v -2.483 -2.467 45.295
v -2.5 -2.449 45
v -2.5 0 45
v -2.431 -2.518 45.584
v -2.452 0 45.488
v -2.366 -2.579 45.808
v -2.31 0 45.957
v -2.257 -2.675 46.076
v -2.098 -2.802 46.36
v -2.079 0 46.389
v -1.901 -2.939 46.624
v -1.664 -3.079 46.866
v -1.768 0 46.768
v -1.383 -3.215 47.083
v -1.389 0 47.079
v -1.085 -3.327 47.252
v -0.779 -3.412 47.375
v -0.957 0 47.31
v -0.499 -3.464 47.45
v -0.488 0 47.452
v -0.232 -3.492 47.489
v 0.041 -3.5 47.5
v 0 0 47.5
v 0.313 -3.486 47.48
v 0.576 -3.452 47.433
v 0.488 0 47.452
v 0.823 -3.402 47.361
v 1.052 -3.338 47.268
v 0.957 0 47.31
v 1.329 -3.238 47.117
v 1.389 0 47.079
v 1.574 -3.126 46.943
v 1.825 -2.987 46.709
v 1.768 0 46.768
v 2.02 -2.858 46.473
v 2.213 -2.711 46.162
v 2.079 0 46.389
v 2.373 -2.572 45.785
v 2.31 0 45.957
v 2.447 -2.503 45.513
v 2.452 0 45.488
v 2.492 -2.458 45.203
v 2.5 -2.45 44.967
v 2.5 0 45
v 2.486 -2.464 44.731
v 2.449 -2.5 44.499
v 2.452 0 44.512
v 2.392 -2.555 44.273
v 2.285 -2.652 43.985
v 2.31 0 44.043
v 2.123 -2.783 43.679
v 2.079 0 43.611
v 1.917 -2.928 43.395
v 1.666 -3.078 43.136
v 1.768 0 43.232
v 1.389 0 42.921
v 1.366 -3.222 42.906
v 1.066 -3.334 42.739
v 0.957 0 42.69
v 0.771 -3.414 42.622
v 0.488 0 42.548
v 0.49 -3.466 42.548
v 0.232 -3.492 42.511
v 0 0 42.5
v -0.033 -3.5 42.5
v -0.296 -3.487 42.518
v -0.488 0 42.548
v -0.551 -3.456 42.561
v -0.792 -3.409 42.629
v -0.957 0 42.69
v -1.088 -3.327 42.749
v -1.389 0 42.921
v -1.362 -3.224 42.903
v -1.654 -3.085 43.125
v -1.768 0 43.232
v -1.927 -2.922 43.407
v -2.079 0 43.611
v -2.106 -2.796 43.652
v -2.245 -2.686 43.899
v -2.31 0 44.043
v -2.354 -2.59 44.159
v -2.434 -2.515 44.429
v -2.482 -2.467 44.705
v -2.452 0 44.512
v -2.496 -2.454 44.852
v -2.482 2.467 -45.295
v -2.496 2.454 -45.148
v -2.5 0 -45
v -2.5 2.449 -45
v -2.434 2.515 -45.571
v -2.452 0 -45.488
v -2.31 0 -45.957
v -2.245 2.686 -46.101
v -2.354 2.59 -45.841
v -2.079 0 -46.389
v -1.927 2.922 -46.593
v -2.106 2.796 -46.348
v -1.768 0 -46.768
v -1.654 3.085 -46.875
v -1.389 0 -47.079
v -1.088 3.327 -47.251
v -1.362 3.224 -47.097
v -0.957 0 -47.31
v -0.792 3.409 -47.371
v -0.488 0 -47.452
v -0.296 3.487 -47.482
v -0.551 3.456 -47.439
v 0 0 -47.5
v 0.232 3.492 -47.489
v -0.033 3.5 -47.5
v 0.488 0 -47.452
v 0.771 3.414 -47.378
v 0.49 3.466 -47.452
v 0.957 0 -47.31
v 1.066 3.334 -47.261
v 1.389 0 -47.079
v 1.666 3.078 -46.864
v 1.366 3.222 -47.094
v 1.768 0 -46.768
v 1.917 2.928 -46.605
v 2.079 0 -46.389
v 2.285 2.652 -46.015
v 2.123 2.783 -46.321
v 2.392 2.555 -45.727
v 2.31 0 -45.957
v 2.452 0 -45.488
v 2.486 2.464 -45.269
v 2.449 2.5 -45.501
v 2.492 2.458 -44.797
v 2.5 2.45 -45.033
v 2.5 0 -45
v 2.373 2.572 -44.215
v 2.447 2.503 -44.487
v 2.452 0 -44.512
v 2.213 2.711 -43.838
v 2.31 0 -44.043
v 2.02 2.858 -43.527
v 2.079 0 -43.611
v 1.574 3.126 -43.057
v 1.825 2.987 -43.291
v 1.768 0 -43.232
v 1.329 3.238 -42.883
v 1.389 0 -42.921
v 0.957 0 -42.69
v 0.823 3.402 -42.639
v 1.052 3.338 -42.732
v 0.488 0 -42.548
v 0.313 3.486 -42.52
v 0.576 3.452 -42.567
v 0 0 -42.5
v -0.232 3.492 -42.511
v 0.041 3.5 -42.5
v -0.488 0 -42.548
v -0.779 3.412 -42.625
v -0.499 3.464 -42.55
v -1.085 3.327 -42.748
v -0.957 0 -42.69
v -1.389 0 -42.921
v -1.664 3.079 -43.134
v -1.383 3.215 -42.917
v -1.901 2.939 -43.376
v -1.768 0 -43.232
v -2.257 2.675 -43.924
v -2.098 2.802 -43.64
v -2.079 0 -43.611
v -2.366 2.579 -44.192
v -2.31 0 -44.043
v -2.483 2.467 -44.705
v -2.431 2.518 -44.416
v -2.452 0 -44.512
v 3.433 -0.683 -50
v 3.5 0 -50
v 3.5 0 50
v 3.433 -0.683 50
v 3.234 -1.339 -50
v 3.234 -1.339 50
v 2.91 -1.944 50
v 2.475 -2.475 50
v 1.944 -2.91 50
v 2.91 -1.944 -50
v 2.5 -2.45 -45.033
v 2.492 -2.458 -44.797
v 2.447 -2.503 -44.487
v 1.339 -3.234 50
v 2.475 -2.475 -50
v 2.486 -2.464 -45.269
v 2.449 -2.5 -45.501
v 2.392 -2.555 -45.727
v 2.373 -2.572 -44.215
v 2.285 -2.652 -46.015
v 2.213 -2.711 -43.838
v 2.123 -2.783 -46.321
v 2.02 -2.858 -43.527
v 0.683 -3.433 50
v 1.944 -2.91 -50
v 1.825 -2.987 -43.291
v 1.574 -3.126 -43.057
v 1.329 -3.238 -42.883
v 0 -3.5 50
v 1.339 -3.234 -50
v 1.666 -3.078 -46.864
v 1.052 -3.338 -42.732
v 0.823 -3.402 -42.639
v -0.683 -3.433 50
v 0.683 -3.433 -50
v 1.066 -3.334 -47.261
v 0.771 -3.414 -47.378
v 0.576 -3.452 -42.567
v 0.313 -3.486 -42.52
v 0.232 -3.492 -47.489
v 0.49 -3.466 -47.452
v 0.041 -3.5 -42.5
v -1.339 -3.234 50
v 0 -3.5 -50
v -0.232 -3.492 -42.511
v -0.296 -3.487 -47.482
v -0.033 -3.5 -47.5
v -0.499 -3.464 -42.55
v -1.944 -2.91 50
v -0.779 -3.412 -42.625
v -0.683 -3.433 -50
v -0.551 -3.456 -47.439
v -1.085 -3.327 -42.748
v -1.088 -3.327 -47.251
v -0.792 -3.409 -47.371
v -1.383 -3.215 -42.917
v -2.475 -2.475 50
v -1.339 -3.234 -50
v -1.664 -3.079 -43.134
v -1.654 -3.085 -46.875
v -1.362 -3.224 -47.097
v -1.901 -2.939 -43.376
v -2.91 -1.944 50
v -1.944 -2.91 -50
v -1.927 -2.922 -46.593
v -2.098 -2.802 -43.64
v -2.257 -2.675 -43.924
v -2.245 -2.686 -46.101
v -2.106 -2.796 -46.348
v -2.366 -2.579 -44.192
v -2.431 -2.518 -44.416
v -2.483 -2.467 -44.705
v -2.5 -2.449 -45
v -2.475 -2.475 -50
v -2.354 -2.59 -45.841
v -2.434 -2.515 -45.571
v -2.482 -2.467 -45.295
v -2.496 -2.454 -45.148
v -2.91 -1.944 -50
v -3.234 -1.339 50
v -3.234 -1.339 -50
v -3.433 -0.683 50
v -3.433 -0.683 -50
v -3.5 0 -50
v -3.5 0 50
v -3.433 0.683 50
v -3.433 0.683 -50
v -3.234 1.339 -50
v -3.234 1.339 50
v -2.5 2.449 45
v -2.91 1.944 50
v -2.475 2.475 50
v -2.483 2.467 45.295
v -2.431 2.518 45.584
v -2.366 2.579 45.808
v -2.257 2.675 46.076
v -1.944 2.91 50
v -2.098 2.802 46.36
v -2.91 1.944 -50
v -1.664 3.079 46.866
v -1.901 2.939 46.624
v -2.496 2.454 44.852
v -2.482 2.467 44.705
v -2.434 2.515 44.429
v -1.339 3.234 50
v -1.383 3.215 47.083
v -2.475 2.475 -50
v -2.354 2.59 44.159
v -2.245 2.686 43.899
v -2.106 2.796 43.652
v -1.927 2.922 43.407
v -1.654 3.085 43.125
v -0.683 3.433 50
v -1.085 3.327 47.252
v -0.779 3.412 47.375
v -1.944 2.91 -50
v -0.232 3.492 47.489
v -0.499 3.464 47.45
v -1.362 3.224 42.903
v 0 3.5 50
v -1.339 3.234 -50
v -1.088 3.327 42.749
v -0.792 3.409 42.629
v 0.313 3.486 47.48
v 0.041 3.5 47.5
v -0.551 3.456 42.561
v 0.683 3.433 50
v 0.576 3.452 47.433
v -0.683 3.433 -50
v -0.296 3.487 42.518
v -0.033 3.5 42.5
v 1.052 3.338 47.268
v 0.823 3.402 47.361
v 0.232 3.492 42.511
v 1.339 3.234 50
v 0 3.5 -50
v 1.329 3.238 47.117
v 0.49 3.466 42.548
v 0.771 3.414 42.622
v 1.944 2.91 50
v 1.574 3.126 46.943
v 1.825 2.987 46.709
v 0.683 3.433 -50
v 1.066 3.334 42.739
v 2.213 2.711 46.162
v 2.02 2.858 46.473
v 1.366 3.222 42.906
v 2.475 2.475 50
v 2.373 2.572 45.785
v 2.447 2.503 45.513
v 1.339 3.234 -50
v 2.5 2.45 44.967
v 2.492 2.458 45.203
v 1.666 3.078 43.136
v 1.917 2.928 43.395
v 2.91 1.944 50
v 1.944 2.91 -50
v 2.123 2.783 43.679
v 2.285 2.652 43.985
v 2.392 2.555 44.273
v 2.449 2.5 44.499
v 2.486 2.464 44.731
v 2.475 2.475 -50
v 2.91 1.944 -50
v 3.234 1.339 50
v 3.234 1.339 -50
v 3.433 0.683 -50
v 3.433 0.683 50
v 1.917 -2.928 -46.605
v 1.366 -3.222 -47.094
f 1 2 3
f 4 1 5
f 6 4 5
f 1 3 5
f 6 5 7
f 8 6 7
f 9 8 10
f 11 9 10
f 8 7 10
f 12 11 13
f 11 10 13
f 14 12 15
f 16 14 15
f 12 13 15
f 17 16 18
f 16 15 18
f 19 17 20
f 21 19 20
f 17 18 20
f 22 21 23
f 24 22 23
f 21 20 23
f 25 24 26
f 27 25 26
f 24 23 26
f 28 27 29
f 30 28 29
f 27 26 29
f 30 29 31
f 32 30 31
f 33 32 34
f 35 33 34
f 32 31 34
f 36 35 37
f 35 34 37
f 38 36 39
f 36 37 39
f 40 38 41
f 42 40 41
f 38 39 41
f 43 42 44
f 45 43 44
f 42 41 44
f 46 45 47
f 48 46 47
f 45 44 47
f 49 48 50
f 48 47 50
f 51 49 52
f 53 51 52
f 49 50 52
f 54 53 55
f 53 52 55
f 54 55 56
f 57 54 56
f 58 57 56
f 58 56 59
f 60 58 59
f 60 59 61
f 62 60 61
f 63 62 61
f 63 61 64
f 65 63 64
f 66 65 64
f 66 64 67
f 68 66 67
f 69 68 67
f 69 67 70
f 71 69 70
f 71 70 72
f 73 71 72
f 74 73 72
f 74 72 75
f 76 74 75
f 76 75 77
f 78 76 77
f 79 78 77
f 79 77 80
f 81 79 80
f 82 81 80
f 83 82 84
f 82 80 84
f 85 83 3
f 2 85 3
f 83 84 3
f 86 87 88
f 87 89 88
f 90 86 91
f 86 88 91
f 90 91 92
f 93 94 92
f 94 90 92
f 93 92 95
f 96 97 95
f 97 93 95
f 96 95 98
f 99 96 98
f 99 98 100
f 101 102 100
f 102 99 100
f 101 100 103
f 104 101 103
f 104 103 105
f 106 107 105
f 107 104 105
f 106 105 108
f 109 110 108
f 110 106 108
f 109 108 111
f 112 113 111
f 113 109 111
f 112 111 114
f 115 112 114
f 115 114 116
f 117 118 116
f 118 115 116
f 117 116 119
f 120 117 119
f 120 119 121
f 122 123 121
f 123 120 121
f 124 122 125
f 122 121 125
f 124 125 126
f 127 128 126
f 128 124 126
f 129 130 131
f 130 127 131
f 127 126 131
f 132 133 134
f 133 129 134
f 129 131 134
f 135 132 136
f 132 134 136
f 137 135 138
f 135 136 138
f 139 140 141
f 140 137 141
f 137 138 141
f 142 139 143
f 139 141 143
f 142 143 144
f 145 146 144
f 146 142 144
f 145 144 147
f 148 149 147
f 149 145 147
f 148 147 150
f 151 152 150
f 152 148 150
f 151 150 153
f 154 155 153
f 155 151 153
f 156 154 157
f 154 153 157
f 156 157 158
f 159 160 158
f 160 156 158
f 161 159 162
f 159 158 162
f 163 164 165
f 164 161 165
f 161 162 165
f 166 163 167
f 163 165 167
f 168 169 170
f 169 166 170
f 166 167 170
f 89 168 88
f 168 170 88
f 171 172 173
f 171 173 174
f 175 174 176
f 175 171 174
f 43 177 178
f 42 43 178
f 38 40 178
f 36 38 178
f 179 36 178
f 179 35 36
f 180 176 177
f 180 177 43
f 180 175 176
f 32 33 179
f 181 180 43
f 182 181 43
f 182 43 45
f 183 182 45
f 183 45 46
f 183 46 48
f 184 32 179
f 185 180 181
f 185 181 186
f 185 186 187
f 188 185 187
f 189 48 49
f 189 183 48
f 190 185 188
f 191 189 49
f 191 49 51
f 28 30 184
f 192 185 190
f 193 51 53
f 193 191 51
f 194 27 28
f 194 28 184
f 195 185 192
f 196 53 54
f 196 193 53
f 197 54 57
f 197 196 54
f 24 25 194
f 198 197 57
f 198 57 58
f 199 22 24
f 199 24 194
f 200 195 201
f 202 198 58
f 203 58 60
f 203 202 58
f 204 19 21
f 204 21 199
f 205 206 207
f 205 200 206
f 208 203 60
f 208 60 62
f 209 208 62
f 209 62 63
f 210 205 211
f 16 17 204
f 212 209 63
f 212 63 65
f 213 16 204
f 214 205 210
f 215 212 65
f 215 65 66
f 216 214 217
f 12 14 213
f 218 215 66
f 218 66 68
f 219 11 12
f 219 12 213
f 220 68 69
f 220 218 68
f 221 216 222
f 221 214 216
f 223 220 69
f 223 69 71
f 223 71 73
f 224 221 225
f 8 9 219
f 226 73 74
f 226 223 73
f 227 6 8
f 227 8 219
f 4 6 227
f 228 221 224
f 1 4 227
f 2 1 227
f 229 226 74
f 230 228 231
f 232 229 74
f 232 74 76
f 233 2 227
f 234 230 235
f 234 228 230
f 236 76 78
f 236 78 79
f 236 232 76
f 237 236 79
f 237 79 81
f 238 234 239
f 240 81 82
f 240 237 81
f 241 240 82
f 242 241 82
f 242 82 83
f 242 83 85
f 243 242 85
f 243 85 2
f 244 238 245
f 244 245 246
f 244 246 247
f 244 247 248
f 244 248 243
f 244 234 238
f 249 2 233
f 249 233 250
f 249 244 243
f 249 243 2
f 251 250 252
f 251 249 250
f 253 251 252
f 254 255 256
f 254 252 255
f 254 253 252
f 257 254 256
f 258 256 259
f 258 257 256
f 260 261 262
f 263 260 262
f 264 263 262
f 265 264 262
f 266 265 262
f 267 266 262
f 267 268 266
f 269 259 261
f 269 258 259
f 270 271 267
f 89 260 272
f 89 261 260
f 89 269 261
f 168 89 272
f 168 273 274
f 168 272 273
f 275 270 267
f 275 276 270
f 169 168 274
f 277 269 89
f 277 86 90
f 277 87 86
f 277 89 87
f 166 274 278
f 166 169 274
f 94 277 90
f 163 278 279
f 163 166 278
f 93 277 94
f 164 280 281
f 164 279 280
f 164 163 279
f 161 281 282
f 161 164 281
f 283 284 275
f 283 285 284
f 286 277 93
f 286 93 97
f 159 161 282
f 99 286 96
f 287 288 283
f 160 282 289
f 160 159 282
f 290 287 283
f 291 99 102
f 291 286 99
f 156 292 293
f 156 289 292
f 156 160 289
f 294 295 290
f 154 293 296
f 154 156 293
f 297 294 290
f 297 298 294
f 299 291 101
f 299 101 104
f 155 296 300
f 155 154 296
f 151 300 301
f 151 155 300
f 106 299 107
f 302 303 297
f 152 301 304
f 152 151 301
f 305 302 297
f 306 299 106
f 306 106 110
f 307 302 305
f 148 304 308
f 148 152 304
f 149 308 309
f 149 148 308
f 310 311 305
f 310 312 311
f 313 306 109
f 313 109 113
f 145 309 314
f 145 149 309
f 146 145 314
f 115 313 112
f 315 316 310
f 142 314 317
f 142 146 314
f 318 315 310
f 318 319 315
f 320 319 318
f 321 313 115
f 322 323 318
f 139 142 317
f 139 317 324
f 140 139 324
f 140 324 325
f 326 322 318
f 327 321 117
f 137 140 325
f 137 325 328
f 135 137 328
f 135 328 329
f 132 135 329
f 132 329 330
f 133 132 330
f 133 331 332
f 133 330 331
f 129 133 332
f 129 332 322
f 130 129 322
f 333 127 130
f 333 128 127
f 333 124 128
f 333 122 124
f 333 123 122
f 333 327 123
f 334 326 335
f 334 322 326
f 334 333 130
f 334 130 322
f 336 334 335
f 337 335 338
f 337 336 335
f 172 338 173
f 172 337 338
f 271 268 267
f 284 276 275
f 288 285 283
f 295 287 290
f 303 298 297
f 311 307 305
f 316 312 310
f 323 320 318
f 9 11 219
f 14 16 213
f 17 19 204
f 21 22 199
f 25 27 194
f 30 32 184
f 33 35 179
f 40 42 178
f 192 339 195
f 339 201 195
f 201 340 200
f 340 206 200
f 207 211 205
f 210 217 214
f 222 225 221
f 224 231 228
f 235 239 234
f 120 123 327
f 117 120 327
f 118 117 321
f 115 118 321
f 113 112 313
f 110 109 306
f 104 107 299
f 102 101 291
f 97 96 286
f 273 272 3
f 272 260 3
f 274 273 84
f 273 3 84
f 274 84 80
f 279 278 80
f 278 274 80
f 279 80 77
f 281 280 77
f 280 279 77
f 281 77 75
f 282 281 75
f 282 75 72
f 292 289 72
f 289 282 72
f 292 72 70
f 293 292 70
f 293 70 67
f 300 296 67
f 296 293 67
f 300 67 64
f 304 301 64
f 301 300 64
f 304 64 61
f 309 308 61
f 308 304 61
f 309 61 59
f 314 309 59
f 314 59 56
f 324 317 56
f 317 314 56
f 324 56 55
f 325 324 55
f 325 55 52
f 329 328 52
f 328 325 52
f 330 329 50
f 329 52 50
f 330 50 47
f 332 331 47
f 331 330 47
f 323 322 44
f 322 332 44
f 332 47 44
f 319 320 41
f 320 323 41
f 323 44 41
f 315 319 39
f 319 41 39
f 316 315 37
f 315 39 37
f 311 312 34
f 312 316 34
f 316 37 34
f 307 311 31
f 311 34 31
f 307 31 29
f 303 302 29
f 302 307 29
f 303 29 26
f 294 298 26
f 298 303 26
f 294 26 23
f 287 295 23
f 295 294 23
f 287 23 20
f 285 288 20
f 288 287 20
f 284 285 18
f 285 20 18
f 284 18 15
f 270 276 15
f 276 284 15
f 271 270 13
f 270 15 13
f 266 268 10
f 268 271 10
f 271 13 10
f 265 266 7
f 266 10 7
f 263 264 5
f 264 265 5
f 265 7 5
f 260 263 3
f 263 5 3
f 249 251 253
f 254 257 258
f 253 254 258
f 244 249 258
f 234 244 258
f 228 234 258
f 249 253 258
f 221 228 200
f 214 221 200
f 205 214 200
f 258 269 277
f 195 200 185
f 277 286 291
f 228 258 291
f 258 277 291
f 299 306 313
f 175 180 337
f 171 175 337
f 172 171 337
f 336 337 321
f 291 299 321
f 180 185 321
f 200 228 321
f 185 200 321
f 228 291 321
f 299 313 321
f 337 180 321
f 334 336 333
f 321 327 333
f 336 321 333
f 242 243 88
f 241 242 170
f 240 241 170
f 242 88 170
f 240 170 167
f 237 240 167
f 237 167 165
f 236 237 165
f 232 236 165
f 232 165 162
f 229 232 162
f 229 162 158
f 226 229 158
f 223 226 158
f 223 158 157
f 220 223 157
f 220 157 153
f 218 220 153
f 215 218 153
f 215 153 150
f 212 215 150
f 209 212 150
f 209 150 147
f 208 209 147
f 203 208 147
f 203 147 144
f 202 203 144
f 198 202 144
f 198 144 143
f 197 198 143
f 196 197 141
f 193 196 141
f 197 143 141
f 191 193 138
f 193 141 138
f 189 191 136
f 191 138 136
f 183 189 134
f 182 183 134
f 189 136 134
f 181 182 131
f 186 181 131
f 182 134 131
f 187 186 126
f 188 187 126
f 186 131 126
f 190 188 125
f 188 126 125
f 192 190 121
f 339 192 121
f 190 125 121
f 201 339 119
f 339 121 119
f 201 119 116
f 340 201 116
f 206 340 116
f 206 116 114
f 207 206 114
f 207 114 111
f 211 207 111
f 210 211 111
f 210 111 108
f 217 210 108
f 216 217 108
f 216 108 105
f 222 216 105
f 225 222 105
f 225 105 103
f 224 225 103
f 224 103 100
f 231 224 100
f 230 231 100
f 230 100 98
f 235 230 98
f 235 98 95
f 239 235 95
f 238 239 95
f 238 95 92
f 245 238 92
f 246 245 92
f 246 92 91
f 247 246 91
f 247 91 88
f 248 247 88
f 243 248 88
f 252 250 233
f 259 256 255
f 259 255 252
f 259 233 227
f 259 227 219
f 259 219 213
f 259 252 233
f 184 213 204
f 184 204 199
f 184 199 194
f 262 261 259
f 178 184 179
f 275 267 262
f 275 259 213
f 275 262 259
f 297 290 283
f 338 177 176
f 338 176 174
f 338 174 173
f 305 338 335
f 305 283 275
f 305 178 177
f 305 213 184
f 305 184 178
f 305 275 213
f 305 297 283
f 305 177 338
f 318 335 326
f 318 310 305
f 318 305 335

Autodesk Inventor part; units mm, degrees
ref_plane "YZ Plane" through (0, 0, 0) normal (1, 0, 0) x (0, 1, 0)
ref_plane "XZ Plane" through (0, 0, 0) normal (0, 1, 0) x (-1, 0, 0)
ref_plane "XY Plane" through (0, 0, 0) normal (0, 0, 1) x (1, 0, 0)
sketch "Sketch1" plane through (0, 0, 0) normal (0, 0, 1) x (1, 0, 0)
  circle A0 centre (0, 0) radius 3.5
  dimension "d0" = 7
extrude "Extrusion1" add sketch "Sketch1" along normal mid plane 100
sketch "Sketch2" plane through (0, 0, 0) normal (0, 1, 0) x (-1, 0, 0)
  circle A0 centre (0, 45) radius 2.5
  circle A1 centre (0, -45) radius 2.5
  point P0 (0, 0)
  dimension "d3" = 5
  dimension "d4" = 45
  dimension "d5" = 5
  dimension "d6" = 45
extrude "Extrusion2" cut sketch "Sketch2" along normal through all both and the other way through all
thread "Thread1" size "M5x0.8" class "6H" standard "ISO Metric profile" full length
thread "Thread2" size "M5x0.8" class "6H" standard "ISO Metric profile" full length
